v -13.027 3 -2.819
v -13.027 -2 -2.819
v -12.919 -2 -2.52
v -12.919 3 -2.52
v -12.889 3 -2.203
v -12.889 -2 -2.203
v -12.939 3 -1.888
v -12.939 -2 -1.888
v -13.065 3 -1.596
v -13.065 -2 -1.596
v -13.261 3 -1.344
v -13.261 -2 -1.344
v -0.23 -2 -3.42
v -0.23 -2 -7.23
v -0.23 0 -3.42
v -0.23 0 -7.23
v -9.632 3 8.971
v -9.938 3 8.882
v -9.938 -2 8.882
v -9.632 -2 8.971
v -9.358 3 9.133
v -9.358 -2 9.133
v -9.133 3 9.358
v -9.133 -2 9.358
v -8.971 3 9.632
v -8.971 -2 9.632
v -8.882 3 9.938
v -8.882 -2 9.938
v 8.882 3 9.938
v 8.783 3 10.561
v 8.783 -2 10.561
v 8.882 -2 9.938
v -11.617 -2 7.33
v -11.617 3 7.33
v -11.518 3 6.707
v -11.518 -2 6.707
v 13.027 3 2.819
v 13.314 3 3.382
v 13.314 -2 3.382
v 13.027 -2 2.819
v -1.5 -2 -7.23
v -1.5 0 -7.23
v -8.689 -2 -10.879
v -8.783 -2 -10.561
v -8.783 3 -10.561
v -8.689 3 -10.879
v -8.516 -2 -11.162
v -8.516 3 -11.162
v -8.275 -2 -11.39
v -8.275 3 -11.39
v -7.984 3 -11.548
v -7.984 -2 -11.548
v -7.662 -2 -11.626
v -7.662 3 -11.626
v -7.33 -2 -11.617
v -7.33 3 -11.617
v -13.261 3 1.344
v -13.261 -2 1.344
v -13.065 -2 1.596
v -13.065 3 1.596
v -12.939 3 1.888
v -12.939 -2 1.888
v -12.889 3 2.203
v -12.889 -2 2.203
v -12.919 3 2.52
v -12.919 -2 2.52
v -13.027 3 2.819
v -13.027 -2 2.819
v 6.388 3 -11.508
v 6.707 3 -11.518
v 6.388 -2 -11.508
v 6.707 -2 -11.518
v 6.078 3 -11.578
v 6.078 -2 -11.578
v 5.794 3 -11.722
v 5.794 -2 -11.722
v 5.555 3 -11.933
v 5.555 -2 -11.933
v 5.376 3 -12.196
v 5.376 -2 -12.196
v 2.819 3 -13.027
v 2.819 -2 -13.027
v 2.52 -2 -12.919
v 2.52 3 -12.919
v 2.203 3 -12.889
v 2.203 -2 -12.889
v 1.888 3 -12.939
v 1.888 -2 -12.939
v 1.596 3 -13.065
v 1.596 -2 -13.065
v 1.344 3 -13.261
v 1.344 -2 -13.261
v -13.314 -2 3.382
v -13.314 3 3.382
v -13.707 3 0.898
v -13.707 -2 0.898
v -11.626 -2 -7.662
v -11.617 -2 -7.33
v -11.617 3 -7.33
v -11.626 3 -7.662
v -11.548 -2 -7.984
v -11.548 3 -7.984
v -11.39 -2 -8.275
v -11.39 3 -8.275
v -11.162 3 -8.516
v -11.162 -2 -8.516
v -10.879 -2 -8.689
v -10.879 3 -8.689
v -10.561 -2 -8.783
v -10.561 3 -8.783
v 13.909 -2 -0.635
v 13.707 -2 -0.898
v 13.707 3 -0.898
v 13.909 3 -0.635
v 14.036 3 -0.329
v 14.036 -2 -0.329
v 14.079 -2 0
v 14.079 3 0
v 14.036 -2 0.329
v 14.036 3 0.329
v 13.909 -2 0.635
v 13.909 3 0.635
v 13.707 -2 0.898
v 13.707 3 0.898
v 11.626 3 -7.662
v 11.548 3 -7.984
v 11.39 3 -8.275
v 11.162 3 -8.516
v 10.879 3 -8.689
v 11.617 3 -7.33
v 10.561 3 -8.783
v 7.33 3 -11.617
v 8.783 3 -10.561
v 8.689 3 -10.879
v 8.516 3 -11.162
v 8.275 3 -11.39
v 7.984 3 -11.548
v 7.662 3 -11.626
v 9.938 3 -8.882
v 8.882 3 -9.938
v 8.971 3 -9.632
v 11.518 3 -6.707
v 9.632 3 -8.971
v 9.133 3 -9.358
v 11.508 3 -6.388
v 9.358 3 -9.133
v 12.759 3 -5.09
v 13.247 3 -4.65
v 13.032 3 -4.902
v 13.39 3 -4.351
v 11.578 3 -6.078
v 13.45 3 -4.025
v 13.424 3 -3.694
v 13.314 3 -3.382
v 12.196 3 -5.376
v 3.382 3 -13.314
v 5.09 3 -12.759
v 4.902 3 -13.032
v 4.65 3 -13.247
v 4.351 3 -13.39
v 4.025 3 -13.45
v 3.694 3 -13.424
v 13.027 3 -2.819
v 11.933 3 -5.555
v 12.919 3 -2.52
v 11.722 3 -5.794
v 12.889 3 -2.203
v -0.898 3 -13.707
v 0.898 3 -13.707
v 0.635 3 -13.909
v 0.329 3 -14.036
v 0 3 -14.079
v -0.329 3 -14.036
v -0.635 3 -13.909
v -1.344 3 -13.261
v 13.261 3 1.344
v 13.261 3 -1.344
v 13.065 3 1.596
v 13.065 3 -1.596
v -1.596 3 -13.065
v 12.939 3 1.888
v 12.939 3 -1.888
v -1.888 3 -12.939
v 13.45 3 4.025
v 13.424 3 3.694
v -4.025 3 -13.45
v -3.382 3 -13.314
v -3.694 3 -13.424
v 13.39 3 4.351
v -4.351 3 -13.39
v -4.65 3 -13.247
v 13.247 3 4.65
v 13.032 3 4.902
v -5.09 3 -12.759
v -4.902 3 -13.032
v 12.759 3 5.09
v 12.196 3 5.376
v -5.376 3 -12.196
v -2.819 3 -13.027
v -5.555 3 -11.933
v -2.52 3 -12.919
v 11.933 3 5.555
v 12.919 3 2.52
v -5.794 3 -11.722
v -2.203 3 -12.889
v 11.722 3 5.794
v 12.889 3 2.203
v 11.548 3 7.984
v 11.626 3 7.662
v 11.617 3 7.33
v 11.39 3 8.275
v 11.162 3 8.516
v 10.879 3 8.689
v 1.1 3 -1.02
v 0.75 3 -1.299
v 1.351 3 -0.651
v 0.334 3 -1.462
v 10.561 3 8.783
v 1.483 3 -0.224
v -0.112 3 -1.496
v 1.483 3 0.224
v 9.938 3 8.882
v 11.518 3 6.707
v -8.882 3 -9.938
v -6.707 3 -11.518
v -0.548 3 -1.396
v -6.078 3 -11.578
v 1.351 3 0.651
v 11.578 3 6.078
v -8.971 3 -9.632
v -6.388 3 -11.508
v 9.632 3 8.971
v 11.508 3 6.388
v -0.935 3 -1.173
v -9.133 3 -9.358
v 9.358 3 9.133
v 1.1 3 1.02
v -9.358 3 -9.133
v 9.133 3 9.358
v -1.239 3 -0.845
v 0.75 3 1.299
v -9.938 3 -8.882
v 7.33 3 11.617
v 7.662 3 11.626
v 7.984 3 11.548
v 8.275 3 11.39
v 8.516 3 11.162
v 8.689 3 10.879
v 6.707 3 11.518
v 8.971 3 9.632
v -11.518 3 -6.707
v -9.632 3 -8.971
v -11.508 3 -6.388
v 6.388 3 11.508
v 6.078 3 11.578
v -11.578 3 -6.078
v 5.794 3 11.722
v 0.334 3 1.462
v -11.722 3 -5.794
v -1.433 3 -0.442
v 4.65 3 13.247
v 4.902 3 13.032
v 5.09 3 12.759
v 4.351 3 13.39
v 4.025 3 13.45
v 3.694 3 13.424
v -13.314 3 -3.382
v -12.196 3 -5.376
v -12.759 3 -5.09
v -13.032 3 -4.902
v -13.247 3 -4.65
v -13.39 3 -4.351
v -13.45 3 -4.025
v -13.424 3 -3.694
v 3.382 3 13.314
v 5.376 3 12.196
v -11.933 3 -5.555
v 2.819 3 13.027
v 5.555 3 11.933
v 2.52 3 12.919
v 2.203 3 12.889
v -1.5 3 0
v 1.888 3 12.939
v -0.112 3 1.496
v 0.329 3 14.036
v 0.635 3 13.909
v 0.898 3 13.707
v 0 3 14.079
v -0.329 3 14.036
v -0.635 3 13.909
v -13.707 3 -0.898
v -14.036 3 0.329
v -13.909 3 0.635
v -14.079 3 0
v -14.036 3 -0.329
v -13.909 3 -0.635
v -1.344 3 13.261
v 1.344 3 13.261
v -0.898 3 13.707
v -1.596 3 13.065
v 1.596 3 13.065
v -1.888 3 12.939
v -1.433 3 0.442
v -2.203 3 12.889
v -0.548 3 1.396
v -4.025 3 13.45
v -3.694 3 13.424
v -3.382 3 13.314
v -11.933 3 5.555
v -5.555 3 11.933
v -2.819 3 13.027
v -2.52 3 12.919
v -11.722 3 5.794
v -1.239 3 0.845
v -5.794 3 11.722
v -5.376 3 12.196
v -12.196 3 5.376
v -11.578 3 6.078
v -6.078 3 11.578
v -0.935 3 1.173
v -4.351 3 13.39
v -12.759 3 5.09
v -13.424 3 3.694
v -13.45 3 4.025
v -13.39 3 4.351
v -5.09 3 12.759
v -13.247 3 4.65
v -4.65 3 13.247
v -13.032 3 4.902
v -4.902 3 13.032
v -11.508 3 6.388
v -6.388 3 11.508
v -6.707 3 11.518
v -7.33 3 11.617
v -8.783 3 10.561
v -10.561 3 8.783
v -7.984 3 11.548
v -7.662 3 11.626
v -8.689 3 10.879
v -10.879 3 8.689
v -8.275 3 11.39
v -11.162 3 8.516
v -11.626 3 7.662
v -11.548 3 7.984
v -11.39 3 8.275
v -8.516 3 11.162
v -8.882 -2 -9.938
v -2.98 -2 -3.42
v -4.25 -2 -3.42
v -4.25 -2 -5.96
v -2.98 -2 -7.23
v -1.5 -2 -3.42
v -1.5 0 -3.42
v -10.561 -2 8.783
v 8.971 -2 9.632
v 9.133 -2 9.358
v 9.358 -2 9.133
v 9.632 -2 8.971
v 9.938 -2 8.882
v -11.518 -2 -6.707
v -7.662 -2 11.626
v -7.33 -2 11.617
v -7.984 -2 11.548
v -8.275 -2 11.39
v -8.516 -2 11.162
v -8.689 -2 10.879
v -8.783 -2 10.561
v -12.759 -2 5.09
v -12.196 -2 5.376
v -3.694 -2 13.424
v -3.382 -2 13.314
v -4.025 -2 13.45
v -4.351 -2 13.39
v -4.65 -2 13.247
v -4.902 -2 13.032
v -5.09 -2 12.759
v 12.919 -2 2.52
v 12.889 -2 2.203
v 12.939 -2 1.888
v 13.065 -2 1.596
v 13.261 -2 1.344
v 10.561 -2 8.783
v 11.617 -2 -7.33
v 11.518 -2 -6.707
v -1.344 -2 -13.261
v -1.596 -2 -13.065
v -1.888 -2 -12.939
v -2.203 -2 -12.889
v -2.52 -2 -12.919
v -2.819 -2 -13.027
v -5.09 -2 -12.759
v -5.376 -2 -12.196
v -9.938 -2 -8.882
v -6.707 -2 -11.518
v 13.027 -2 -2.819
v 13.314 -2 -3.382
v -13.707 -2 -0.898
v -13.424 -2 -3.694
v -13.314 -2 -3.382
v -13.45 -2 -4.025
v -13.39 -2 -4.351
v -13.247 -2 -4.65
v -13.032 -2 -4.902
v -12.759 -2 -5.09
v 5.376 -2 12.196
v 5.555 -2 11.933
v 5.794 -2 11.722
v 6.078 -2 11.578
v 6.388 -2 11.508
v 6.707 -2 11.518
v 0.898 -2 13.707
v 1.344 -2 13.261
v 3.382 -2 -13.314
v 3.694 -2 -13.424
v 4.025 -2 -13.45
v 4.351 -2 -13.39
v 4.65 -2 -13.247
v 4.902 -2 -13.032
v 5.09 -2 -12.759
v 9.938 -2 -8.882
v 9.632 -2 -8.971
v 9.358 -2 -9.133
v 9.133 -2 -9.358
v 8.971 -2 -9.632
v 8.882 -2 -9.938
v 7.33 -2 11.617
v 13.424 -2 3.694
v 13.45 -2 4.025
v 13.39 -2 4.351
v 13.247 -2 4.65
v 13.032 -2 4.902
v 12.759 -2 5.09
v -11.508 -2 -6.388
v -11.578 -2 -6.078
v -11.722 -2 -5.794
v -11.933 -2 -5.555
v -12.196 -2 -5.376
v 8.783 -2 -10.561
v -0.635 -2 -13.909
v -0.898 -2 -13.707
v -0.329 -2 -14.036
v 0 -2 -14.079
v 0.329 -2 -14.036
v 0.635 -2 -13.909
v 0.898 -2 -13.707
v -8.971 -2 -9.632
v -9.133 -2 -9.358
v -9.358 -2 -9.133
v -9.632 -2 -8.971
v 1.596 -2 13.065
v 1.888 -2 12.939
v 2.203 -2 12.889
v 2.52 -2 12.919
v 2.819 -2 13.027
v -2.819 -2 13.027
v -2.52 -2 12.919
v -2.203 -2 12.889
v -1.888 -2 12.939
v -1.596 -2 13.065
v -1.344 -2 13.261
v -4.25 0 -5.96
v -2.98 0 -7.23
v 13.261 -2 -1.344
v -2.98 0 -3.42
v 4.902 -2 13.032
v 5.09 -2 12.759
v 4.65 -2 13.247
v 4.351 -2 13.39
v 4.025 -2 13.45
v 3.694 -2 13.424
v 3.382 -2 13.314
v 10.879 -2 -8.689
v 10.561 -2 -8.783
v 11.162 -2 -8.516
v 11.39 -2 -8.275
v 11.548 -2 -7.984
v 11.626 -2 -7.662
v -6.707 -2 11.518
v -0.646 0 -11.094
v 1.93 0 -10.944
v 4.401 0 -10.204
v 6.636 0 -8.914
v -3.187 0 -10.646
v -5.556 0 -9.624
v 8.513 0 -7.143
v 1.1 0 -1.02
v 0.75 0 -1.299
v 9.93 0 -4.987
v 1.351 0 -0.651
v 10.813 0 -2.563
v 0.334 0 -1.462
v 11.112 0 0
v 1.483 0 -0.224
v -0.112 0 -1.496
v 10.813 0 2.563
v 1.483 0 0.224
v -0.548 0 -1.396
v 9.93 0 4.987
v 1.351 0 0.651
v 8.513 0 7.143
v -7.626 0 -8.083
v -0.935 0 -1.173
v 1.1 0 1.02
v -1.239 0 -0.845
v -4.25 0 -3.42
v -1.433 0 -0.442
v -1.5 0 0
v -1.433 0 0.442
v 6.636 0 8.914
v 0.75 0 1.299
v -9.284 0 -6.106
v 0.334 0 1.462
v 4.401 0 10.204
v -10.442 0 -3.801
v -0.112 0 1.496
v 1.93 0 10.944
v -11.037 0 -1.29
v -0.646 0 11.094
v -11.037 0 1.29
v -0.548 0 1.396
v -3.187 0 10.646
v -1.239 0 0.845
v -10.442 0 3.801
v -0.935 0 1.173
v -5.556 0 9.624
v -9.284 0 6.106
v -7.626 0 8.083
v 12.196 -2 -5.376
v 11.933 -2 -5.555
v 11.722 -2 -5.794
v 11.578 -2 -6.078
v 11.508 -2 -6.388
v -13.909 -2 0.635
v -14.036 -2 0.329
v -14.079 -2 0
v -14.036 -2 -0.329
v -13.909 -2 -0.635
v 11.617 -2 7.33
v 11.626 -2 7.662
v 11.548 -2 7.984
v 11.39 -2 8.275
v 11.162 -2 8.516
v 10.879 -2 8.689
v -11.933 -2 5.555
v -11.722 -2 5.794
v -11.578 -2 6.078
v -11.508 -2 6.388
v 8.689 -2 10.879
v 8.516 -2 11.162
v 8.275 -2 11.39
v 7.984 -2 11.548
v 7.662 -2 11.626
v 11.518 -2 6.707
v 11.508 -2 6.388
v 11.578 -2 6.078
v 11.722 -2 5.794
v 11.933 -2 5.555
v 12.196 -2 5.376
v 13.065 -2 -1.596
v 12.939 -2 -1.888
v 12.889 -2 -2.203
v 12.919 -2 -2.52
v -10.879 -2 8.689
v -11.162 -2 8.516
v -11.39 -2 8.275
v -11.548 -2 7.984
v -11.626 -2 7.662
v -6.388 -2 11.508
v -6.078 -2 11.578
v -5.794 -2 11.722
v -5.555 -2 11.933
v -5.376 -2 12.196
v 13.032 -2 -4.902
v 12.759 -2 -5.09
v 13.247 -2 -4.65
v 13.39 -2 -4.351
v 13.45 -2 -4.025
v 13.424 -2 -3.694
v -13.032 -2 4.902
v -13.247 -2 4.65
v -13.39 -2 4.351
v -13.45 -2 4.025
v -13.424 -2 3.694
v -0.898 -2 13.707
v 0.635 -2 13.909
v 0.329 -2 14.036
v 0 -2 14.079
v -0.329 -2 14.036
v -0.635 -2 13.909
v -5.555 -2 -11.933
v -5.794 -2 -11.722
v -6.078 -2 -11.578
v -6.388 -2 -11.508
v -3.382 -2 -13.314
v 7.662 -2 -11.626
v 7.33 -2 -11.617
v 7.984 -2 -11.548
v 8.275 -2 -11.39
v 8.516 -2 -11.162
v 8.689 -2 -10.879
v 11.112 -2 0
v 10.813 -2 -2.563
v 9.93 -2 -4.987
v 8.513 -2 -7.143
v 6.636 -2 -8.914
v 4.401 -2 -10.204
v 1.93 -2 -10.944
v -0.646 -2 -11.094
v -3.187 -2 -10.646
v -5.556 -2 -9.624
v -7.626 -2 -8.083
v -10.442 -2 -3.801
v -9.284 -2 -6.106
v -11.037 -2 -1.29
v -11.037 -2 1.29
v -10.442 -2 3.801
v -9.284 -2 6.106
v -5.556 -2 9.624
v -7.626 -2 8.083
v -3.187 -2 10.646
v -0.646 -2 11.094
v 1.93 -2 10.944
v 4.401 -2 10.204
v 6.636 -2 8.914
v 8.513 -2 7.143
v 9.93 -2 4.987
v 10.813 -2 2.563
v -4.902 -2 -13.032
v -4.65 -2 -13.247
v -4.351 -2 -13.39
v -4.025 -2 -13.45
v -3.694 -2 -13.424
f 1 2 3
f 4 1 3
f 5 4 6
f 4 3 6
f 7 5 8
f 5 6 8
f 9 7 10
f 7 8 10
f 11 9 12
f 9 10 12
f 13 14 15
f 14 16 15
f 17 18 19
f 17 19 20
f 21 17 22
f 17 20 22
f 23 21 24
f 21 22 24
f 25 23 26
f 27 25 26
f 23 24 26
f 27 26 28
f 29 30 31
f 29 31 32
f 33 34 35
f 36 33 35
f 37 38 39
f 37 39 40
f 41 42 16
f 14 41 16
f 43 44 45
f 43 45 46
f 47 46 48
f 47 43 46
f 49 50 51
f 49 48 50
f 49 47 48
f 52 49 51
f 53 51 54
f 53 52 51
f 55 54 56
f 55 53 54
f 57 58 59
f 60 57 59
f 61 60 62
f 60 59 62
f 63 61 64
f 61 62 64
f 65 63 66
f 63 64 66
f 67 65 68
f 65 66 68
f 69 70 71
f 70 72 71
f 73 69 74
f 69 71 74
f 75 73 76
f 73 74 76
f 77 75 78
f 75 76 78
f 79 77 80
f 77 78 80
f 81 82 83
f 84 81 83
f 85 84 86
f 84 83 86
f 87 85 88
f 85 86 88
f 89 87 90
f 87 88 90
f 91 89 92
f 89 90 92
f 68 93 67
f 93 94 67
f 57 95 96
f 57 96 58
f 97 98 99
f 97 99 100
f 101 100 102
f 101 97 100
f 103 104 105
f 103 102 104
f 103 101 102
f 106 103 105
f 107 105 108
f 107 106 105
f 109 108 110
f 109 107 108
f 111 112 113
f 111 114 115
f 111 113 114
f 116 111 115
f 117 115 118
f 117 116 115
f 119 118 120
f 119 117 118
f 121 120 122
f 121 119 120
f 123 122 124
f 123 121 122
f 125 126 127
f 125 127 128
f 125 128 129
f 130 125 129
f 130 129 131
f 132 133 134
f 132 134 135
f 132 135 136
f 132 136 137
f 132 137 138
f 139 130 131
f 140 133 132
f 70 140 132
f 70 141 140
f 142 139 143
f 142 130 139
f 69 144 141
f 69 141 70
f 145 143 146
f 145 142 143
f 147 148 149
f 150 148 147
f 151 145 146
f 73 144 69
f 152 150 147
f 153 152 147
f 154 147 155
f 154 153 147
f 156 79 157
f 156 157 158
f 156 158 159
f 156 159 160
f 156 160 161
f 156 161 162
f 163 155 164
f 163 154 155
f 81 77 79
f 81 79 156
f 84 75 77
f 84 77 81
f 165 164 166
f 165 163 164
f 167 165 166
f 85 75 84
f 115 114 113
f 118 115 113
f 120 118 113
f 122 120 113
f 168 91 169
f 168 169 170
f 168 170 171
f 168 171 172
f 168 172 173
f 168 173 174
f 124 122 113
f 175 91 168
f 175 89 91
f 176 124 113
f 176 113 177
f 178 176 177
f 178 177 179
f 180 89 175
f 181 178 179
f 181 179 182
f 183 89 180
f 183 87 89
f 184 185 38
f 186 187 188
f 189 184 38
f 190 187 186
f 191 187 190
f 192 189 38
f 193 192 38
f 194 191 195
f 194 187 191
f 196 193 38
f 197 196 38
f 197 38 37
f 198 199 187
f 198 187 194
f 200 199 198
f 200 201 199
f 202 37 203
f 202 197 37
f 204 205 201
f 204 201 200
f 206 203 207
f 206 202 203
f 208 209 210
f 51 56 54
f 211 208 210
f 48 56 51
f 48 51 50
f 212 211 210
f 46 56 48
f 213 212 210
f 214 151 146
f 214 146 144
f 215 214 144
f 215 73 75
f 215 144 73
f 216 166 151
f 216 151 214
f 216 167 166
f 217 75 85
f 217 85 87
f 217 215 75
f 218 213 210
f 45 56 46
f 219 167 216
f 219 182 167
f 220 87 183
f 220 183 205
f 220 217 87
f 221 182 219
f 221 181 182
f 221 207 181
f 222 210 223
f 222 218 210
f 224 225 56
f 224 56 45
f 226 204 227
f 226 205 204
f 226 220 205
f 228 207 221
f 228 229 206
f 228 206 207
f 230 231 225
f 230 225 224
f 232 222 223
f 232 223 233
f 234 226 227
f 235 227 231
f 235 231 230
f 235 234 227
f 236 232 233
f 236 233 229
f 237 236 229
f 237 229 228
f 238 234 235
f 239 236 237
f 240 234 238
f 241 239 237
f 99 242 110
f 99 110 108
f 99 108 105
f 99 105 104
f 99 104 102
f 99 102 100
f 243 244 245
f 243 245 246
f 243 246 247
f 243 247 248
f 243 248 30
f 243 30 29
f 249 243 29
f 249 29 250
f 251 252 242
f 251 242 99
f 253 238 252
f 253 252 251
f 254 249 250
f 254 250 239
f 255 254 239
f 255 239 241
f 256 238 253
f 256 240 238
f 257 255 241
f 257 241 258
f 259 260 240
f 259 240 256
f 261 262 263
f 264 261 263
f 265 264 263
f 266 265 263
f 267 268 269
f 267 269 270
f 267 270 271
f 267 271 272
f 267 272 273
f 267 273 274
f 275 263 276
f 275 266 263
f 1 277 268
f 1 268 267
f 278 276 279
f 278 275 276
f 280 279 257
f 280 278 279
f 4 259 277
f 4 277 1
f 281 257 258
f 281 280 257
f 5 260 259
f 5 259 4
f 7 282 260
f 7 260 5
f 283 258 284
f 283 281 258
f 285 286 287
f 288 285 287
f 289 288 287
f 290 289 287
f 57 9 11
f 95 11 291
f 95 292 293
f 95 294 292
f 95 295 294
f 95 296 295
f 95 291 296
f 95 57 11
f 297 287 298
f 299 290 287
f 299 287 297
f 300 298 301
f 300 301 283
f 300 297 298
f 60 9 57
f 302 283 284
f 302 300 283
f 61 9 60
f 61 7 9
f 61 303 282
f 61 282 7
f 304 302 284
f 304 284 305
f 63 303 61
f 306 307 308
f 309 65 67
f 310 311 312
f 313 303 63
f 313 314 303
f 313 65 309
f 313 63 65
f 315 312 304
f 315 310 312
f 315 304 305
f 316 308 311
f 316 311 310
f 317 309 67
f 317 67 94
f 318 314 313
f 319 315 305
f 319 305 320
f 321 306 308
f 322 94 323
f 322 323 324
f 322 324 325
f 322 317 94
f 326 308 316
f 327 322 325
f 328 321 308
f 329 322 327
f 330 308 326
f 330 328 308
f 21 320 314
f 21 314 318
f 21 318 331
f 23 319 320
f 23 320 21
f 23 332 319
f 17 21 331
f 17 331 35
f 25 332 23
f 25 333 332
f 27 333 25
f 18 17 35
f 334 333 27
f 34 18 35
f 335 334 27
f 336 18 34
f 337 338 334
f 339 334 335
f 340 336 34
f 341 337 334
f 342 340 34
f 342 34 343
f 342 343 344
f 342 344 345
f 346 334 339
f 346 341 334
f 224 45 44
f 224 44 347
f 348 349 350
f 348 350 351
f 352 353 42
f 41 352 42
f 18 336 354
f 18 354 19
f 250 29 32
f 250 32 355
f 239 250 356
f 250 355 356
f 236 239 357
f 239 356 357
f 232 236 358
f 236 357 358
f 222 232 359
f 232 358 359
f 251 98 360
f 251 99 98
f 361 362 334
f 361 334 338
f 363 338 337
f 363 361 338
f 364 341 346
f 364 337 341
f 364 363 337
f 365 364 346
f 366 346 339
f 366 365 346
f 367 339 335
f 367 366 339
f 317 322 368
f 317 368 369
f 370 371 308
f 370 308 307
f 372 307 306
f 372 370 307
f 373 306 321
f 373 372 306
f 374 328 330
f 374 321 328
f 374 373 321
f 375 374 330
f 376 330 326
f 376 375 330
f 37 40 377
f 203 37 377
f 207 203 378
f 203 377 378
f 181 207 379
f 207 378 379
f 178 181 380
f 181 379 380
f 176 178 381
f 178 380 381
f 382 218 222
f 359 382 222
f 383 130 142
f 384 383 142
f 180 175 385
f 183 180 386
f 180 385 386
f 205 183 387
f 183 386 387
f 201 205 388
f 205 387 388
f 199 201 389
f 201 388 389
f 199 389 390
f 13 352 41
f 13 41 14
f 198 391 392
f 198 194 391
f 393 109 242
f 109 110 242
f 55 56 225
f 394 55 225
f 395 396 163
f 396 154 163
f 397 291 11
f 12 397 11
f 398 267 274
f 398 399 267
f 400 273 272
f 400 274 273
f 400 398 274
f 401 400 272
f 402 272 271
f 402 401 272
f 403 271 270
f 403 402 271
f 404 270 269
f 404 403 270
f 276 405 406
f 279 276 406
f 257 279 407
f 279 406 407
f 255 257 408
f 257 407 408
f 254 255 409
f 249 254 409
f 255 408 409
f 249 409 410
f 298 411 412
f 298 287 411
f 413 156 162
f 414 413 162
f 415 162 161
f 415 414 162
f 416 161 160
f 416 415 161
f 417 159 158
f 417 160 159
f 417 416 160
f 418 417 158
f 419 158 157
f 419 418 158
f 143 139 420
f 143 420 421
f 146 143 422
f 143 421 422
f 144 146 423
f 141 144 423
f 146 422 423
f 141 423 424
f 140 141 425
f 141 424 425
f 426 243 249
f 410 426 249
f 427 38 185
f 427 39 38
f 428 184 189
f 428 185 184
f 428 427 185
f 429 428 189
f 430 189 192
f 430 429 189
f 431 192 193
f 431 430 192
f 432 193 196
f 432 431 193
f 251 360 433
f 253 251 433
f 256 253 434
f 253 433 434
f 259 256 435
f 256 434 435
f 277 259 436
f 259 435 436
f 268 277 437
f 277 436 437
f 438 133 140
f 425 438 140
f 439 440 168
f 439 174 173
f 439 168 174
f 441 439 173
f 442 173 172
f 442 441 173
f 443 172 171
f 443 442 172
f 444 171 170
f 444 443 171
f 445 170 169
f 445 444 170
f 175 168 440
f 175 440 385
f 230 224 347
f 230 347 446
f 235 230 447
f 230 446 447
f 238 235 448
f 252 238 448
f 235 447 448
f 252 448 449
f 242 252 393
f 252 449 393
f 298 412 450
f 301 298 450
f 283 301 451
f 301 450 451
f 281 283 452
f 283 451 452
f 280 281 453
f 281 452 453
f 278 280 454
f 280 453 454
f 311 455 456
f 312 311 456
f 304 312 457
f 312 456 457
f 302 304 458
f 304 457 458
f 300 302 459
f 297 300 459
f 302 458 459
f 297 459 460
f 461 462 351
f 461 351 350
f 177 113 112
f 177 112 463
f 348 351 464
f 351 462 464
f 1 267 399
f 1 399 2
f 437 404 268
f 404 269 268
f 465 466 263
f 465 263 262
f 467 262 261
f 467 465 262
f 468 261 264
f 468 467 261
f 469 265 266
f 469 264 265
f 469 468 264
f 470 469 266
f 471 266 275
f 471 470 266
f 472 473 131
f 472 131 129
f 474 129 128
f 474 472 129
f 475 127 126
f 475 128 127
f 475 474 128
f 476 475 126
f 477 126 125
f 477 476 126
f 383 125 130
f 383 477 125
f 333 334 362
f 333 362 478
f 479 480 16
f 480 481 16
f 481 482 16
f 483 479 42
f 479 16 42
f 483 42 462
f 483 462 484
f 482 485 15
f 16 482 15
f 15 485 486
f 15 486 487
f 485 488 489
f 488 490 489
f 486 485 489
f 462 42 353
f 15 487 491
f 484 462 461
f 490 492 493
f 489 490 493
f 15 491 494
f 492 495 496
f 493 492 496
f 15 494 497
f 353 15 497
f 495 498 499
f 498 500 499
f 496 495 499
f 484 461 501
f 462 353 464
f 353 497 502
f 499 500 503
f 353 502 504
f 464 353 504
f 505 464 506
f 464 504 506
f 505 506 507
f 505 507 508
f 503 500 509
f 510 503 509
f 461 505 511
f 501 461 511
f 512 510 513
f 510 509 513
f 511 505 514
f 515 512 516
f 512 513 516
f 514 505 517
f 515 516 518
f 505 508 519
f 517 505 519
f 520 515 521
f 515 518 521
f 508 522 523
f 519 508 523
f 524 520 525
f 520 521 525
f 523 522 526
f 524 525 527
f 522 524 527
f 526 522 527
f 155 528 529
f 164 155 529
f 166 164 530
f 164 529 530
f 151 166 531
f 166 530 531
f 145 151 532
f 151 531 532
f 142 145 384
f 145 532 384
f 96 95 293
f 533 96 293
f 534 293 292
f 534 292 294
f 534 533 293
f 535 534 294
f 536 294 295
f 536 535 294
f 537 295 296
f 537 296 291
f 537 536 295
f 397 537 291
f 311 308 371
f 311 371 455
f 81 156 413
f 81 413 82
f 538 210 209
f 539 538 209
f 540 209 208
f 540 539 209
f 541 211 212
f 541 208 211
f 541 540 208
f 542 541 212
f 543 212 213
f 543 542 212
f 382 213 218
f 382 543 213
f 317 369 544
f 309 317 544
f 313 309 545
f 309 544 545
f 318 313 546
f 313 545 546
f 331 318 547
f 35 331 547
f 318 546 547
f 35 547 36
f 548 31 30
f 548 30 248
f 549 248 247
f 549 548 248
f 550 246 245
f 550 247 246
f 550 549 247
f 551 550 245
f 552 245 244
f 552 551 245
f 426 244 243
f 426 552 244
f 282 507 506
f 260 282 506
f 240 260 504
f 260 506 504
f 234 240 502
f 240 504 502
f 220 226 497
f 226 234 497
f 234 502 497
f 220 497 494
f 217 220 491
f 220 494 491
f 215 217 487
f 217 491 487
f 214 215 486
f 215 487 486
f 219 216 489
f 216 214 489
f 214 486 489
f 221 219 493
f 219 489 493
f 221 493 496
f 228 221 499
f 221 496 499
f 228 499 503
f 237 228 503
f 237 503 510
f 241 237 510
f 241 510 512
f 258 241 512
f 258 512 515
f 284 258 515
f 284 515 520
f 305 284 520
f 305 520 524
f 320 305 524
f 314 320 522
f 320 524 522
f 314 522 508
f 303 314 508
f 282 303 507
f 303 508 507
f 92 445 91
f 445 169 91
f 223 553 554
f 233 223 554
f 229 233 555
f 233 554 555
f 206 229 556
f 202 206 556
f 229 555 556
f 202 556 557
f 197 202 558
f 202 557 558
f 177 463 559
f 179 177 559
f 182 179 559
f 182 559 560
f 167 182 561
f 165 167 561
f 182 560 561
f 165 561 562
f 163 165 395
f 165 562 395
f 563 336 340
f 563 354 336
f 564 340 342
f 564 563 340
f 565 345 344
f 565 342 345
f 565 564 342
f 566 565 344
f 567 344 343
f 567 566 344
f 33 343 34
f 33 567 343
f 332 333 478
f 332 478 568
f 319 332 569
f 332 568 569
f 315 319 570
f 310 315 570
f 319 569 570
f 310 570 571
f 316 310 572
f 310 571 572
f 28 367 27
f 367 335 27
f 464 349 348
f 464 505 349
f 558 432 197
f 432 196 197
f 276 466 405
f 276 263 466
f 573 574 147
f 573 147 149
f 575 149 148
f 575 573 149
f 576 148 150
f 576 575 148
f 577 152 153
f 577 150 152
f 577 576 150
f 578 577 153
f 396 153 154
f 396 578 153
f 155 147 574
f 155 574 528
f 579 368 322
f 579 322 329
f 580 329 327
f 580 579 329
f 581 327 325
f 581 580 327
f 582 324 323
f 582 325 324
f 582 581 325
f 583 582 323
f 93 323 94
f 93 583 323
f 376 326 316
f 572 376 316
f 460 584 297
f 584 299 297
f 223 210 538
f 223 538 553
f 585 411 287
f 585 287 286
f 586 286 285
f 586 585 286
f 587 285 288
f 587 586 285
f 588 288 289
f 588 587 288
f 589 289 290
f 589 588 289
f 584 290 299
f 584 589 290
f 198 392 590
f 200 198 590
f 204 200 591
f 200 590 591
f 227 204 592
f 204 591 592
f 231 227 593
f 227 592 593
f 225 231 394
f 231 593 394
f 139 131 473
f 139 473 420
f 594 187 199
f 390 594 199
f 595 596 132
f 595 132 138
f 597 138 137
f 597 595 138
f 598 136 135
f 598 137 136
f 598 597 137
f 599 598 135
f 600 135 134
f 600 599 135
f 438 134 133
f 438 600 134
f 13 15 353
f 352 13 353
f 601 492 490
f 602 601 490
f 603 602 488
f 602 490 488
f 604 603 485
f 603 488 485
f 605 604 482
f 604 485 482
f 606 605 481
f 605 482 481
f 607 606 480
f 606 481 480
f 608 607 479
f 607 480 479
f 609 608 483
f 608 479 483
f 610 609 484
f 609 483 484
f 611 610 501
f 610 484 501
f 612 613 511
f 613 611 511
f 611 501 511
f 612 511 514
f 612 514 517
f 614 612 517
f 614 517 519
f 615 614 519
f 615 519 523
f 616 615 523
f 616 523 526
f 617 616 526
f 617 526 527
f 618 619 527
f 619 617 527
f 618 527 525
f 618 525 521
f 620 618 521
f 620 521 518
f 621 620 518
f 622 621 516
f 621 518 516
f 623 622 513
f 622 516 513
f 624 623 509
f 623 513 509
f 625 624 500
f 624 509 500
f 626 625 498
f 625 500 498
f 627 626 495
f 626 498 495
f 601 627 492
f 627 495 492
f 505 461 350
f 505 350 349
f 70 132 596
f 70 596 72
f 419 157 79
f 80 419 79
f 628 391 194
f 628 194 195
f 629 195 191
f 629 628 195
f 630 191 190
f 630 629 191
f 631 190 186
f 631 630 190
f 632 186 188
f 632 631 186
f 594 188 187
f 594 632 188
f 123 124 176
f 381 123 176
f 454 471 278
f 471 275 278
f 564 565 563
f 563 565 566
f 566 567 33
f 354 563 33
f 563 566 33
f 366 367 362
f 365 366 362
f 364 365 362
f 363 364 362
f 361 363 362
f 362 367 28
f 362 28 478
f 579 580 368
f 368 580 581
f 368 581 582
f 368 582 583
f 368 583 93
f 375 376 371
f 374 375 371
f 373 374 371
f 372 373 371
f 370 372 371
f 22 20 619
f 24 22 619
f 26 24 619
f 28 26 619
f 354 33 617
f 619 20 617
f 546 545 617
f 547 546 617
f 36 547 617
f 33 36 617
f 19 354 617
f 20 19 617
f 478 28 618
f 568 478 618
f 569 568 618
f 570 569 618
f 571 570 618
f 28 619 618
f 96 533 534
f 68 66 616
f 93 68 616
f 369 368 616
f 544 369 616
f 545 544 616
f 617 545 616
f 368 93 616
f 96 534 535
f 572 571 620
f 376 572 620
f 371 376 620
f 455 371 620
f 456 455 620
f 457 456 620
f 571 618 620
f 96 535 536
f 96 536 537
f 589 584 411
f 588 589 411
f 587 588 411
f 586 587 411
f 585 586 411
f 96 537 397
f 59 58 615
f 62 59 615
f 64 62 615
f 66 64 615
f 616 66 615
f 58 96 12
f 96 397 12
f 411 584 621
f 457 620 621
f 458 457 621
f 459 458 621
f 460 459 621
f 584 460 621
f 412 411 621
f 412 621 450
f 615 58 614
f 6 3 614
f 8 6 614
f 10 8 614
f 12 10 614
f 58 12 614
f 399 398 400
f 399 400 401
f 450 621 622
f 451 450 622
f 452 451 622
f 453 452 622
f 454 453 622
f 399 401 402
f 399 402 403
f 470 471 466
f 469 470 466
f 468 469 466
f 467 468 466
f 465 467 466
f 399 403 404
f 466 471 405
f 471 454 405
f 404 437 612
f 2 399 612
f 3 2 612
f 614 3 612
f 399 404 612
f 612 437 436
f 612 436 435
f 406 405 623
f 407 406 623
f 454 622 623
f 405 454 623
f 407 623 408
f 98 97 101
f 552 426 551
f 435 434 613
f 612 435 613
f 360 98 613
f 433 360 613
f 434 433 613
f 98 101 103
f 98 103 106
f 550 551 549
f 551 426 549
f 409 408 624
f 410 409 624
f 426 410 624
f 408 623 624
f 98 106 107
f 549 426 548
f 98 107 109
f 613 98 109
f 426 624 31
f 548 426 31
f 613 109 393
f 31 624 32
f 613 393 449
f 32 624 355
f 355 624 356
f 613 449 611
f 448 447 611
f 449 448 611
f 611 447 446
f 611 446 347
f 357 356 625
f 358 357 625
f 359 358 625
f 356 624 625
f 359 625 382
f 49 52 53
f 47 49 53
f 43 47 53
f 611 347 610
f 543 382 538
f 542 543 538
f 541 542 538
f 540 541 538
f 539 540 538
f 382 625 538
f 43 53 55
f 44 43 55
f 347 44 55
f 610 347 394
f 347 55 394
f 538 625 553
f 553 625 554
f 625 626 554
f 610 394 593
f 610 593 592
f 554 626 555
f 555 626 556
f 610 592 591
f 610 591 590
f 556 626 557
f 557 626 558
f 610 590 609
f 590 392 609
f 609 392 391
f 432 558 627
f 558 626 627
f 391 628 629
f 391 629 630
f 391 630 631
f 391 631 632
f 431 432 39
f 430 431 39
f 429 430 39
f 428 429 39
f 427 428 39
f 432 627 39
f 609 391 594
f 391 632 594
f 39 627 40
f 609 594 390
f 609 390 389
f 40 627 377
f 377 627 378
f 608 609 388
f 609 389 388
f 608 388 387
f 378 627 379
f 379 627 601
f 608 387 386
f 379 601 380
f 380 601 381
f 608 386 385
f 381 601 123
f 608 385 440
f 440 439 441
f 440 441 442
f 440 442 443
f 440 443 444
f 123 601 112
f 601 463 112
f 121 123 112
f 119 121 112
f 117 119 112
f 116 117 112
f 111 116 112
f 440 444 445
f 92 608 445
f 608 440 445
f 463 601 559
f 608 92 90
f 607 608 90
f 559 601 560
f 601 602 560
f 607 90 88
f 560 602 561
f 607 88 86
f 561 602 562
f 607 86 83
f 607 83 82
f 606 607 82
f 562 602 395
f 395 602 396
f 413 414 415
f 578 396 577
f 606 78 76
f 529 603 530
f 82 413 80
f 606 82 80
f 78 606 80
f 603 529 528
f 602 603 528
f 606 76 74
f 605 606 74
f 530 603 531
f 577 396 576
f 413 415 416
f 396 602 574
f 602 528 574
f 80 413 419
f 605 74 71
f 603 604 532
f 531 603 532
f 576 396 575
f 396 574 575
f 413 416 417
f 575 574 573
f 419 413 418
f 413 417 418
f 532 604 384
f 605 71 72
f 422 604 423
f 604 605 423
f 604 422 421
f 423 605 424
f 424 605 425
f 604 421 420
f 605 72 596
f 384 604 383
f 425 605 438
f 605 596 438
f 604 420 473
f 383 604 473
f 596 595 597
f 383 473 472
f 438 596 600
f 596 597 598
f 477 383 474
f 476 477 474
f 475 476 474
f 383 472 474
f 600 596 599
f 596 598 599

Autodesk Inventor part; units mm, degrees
ref_plane "YZ Plane" through (0, 0, 0) normal (1, 0, 0) x (0, 1, 0)
ref_plane "XZ Plane" through (0, 0, 0) normal (0, 1, 0) x (-1, 0, 0)
ref_plane "XY Plane" through (0, 0, 0) normal (0, 0, 1) x (1, 0, 0)
sketch "Sketch1" plane through (0, 0, 0) normal (0, 1, 0) x (-1, 0, 0)
  circle A0 centre (0, 0) radius 1.5
  circle A1 centre (0, 0) radius 12.7
  dimension "d0" = 3
  dimension "d1" = 25.4
extrude "Extrusion1" add sketch "Sketch1" along normal blind 3
sketch "Sketch3" plane through (0, 0, 0) normal (0, -1, 0) x (1, 0, 0)
  circle A0 centre (0, 0) radius 11.1125
  circle A1 centre (0, 0) radius 12.7 projected
  circle A2 centre (0, 0) radius 1.5 projected
  circle A3 centre (0, 0) radius 12.7 projected
  circle A4 centre (0, 0) radius 1.5 projected
  circle A5 centre (0, 0) radius 12.7
  dimension "d14" = 22.225
extrude "Extrusion3" add sketch "Sketch3" along normal blind 2 contours A1
sketch "Sketch4" plane through (0, 0, 0) normal (0, -1, 0) x (1, 0, 0)
  circle A0 centre (0, 0) radius 1.5 projected
  circle A1 centre (0, 0) radius 1.5 projected
  line L0 (-1.4799, -0.2447) -> (-2.9799, -0.2447)
  line L1 (-2.9799, -0.2447) -> (-1.5, -0.2447)
  line L2 (-1.5, -0.2447) -> (-1.5, 7.3753)
  line L3 (-1.5, 7.3753) -> (-2.9799, 7.3753)
  line L4 (-2.9799, 7.3753) -> (-2.9799, -0.2447)
  line L5 (-2.9799, 7.3753) -> (-4.2499, 7.3753)
  line L6 (-4.2499, 7.3753) -> (-4.2499, 3.5653)
  line L7 (-4.2499, 3.5653) -> (-2.9799, 3.5653)
  line L8 (-2.9799, 3.5653) -> (-2.9799, 7.3753)
  line L9 (-1.5, 7.3753) -> (-0.23, 7.3753)
  line L10 (-0.23, 7.3753) -> (-0.23, 3.5653)
  line L11 (-0.23, 3.5653) -> (-1.5, 3.5653)
  line L12 (-1.5, 3.5653) -> (-1.5, 7.3753)
  line L13 (-2.9799, -0.2447) -> (-1.5, -0.2447)
  line L14 (-1.5, -0.2447) -> (-1.5, -7.2297)
  line L15 (-1.5, -7.2297) -> (-2.9799, -7.2297)
  line L16 (-2.9799, -7.2297) -> (-2.9799, -0.2447)
  line L17 (-2.9799, -7.2297) -> (-4.2499, -7.2297)
  line L18 (-4.2499, -7.2297) -> (-4.2499, -3.4197)
  line L19 (-4.2499, -3.4197) -> (-2.9799, -3.4197)
  line L20 (-2.9799, -3.4197) -> (-2.9799, -7.2297)
  line L21 (-1.5, -7.2297) -> (-0.23, -7.2297)
  line L22 (-0.23, -7.2297) -> (-0.23, -3.4197)
  line L23 (-0.23, -3.4197) -> (-1.5, -3.4197)
  line L24 (-1.5, -3.4197) -> (-1.5, -7.2297)
  line L25 (-2.9799, -7.2297) -> (-4.2499, -5.9597)
  line L26 (-2.9799, -7.2297) -> (-1.1839, -7.2297) construction
  point P0 (-2.9799, 3.5653)
  point P1 (-2.9799, -3.4197)
  dimension "d17" = 1.5
  dimension "d18" = 7.62
  dimension "d19" = 1.27
  dimension "d20" = 3.81
  dimension "d21" = 1.27
  dimension "d22" = 3.81
  dimension "d37" = 6.985
  dimension "d38" = 1.27
  dimension "d39" = 3.81
  dimension "d40" = 1.27
  dimension "d41" = 135
extrude "Extrusion4" add sketch "Sketch4" along normal blind 2 contours L23 L22 L21 L14 | L16 L25 L18 L19
sketch "Sketch5" plane through (0, 3, 0) normal (0, 1, 0) x (1, 0, 0)
  circle A0 centre (0, 0) radius 12.7 projected
  circle A1 centre (0, 0) radius 1.5 projected
  circle A2 centre (0, 0) radius 12.7 projected
  line L0 (0, 12.7) -> (0, 14.605)
  line L1 (0, 14.605) -> (2.0758, 12.5292)
  line L2 (0, 14.605) -> (-2.0758, 12.5292)
  line L3 (0, 14.605) -> (2.9356, 14.605) construction
  line L4 (-4.5132, 13.8902) -> (-1.8975, 12.5574)
  line L5 (-3.9245, 12.0784) -> (-4.5132, 13.8902)
  line L6 (-4.5132, 13.8902) -> (-5.8459, 11.2745)
  line L7 (-8.5846, 11.8157) -> (-5.6851, 11.3565)
  line L8 (-7.4649, 10.2745) -> (-8.5846, 11.8157)
  line L9 (-8.5846, 11.8157) -> (-9.0438, 8.9162)
  line L10 (-11.8157, 8.5846) -> (-8.9162, 9.0438)
  line L11 (-10.2745, 7.4649) -> (-11.8157, 8.5846)
  line L12 (-11.8157, 8.5846) -> (-11.3565, 5.6851)
  line L13 (-13.8902, 4.5132) -> (-11.2745, 5.8459)
  line L14 (-12.0784, 3.9245) -> (-13.8902, 4.5132)
  line L15 (-13.8902, 4.5132) -> (-12.5574, 1.8975)
  line L16 (-14.605, 0) -> (-12.5292, 2.0758)
  line L17 (-12.7, 0) -> (-14.605, 0)
  line L18 (-14.605, 0) -> (-12.5292, -2.0758)
  line L19 (-13.8902, -4.5132) -> (-12.5574, -1.8975)
  line L20 (-12.0784, -3.9245) -> (-13.8902, -4.5132)
  line L21 (-13.8902, -4.5132) -> (-11.2745, -5.8459)
  line L22 (-11.8157, -8.5846) -> (-11.3565, -5.6851)
  line L23 (-10.2745, -7.4649) -> (-11.8157, -8.5846)
  line L24 (-11.8157, -8.5846) -> (-8.9162, -9.0438)
  line L25 (-8.5846, -11.8157) -> (-9.0438, -8.9162)
  line L26 (-7.4649, -10.2745) -> (-8.5846, -11.8157)
  line L27 (-8.5846, -11.8157) -> (-5.6851, -11.3565)
  line L28 (-4.5132, -13.8902) -> (-5.8459, -11.2745)
  line L29 (-3.9245, -12.0784) -> (-4.5132, -13.8902)
  line L30 (-4.5132, -13.8902) -> (-1.8975, -12.5574)
  line L31 (0, -14.605) -> (-2.0758, -12.5292)
  line L32 (0, -12.7) -> (0, -14.605)
  line L33 (0, -14.605) -> (2.0758, -12.5292)
  line L34 (4.5132, -13.8902) -> (1.8975, -12.5574)
  line L35 (3.9245, -12.0784) -> (4.5132, -13.8902)
  line L36 (4.5132, -13.8902) -> (5.8459, -11.2745)
  line L37 (8.5846, -11.8157) -> (5.6851, -11.3565)
  line L38 (7.4649, -10.2745) -> (8.5846, -11.8157)
  line L39 (8.5846, -11.8157) -> (9.0438, -8.9162)
  line L40 (11.8157, -8.5846) -> (8.9162, -9.0438)
  line L41 (10.2745, -7.4649) -> (11.8157, -8.5846)
  line L42 (11.8157, -8.5846) -> (11.3565, -5.6851)
  line L43 (13.8902, -4.5132) -> (11.2745, -5.8459)
  line L44 (12.0784, -3.9245) -> (13.8902, -4.5132)
  line L45 (13.8902, -4.5132) -> (12.5574, -1.8975)
  line L46 (14.605, 0) -> (12.5292, -2.0758)
  line L47 (12.7, 0) -> (14.605, 0)
  line L48 (14.605, 0) -> (12.5292, 2.0758)
  line L49 (13.8902, 4.5132) -> (12.5574, 1.8975)
  line L50 (12.0784, 3.9245) -> (13.8902, 4.5132)
  line L51 (13.8902, 4.5132) -> (11.2745, 5.8459)
  line L52 (11.8157, 8.5846) -> (11.3565, 5.6851)
  line L53 (10.2745, 7.4649) -> (11.8157, 8.5846)
  line L54 (11.8157, 8.5846) -> (8.9162, 9.0438)
  line L55 (8.5846, 11.8157) -> (9.0438, 8.9162)
  line L56 (7.4649, 10.2745) -> (8.5846, 11.8157)
  line L57 (8.5846, 11.8157) -> (5.6851, 11.3565)
  line L58 (4.5132, 13.8902) -> (5.8459, 11.2745)
  line L59 (3.9245, 12.0784) -> (4.5132, 13.8902)
  line L60 (4.5132, 13.8902) -> (1.8975, 12.5574)
  point P0 (-1.9969, 12.6081)
  point P1 (-5.7953, 11.3739)
  point P2 (-9.0264, 9.0264)
  point P3 (-11.3739, 5.7953)
  point P4 (-12.6081, 1.9969)
  point P5 (-12.6081, -1.9969)
  point P6 (-11.3739, -5.7953)
  point P7 (-9.0264, -9.0264)
  point P8 (-5.7953, -11.3739)
  point P9 (-1.9969, -12.6081)
  point P10 (1.9969, -12.6081)
  point P11 (5.7953, -11.3739)
  point P12 (9.0264, -9.0264)
  point P13 (11.3739, -5.7953)
  point P14 (12.6081, -1.9969)
  point P15 (12.6081, 1.9969)
  point P16 (11.3739, 5.7953)
  point P17 (9.0264, 9.0264)
  point P18 (5.7953, 11.3739)
  point P19 (1.9969, 12.6081)
  dimension "d28" = 1.905
  dimension "d29" = 45
  dimension "d30" = 135
  dimension "d33" = 360
extrude "Extrusion5" add sketch "Sketch5" against normal up to surface (5 mm away) contours L47 L46 L45 A0 | A0 L49 L48 L47 | A0 L48 L49 | L45 L46 A0 | A0 L50 L49 L48 | L46 L45 L44 A0 | A0 L52 L51 L50 | L44 L43 L42 A0 | A0 L51 L52 | L51 A0 L53 L52 | L42 L43 A0 | L42 L41 A0 L43 | L53 A0 L55 L54 | L40 L39 A0 L41 | L55 A0 L54 | L54 A0 L56 L55 | L40 A0 L39 | L39 L38 A0 L40 | L56 A0 L58 L57 | L37 L36 A0 L38 | L58 A0 L57 | L57 A0 L59 L58 | L37 A0 L36 | L36 L35 A0 L37 | L59 A0 L1 L60 | L34 L33 A0 L35 | L60 A0 L0 L1 | L1 A0 L60 | L34 A0 L33 | L33 L32 A0 L34 | L0 A0 L4 L2 | L31 L30 A0 L32 | L4 A0 L2 | L2 A0 L5 L4 | L31 A0 L30 | L30 L29 A0 L31 | L5 A0 L7 L6 | L28 L27 A0 L29 | L7 A0 L6 | L6 A0 L8 L7 | L28 A0 L27 | L27 L26 A0 L28 | L8 A0 L10 L9 | L25 L24 A0 L26 | L10 A0 L9 | L9 A0 L11 L10 | L25 A0 L24 | L24 L23 A0 L25 | L11 A0 L13 L12 | L22 L21 A0 L23 | L13 A0 L12 | L12 A0 L14 L13 | L22 A0 L21 | L21 L20 A0 L22 | L14 A0 L16 L15 | L19 L18 A0 L20 | L16 A0 L15 | L15 A0 L17 L16 | L19 A0 L18 | L18 L17 A0 L19
fillet "Fillet1" radius 1.27 40 edges at (11.8157, 0.5, 8.5846) (8.5846, 0.5, 11.8157) (4.5132, 0.5, 13.8902) (0, 0.5, 14.605) (-4.5132, 0.5, 13.8902) (-8.5846, 0.5, 11.8157) (-11.8157, 0.5, 8.5846) (-13.8902, 0.5, 4.5132) (-14.605, 0.5, 0) (-13.8902, 0.5, -4.5132) (-11.8157, 0.5, -8.5846) (-8.5846, 0.5, -11.8157) (-4.5132, 0.5, -13.8902) (0, 0.5, -14.605) (4.5132, 0.5, -13.8902) (8.5846, 0.5, -11.8157) (11.8157, 0.5, -8.5846) (9.0264, 0.5, -9.0264) (13.8902, 0.5, -4.5132) (14.605, 0.5, 0) (13.8902, 0.5, 4.5132) (11.3739, 0.5, -5.7953) (12.6081, 0.5, -1.9969) (12.6081, 0.5, 1.9969) (11.3739, 0.5, 5.7953) (9.0264, 0.5, 9.0264) (5.7953, 0.5, 11.3739) (1.9969, 0.5, 12.6081) (-1.9969, 0.5, 12.6081) (-5.7953, 0.5, 11.3739) (-9.0264, 0.5, 9.0264) (-11.3739, 0.5, 5.7953) (-12.6081, 0.5, 1.9969) (-12.6081, 0.5, -1.9969) (-11.3739, 0.5, -5.7953) (-9.0264, 0.5, -9.0264) (-5.7953, 0.5, -11.3739) (-1.9969, 0.5, -12.6081) (1.9969, 0.5, -12.6081) (5.7953, 0.5, -11.3739)
properties part number "Knob"
